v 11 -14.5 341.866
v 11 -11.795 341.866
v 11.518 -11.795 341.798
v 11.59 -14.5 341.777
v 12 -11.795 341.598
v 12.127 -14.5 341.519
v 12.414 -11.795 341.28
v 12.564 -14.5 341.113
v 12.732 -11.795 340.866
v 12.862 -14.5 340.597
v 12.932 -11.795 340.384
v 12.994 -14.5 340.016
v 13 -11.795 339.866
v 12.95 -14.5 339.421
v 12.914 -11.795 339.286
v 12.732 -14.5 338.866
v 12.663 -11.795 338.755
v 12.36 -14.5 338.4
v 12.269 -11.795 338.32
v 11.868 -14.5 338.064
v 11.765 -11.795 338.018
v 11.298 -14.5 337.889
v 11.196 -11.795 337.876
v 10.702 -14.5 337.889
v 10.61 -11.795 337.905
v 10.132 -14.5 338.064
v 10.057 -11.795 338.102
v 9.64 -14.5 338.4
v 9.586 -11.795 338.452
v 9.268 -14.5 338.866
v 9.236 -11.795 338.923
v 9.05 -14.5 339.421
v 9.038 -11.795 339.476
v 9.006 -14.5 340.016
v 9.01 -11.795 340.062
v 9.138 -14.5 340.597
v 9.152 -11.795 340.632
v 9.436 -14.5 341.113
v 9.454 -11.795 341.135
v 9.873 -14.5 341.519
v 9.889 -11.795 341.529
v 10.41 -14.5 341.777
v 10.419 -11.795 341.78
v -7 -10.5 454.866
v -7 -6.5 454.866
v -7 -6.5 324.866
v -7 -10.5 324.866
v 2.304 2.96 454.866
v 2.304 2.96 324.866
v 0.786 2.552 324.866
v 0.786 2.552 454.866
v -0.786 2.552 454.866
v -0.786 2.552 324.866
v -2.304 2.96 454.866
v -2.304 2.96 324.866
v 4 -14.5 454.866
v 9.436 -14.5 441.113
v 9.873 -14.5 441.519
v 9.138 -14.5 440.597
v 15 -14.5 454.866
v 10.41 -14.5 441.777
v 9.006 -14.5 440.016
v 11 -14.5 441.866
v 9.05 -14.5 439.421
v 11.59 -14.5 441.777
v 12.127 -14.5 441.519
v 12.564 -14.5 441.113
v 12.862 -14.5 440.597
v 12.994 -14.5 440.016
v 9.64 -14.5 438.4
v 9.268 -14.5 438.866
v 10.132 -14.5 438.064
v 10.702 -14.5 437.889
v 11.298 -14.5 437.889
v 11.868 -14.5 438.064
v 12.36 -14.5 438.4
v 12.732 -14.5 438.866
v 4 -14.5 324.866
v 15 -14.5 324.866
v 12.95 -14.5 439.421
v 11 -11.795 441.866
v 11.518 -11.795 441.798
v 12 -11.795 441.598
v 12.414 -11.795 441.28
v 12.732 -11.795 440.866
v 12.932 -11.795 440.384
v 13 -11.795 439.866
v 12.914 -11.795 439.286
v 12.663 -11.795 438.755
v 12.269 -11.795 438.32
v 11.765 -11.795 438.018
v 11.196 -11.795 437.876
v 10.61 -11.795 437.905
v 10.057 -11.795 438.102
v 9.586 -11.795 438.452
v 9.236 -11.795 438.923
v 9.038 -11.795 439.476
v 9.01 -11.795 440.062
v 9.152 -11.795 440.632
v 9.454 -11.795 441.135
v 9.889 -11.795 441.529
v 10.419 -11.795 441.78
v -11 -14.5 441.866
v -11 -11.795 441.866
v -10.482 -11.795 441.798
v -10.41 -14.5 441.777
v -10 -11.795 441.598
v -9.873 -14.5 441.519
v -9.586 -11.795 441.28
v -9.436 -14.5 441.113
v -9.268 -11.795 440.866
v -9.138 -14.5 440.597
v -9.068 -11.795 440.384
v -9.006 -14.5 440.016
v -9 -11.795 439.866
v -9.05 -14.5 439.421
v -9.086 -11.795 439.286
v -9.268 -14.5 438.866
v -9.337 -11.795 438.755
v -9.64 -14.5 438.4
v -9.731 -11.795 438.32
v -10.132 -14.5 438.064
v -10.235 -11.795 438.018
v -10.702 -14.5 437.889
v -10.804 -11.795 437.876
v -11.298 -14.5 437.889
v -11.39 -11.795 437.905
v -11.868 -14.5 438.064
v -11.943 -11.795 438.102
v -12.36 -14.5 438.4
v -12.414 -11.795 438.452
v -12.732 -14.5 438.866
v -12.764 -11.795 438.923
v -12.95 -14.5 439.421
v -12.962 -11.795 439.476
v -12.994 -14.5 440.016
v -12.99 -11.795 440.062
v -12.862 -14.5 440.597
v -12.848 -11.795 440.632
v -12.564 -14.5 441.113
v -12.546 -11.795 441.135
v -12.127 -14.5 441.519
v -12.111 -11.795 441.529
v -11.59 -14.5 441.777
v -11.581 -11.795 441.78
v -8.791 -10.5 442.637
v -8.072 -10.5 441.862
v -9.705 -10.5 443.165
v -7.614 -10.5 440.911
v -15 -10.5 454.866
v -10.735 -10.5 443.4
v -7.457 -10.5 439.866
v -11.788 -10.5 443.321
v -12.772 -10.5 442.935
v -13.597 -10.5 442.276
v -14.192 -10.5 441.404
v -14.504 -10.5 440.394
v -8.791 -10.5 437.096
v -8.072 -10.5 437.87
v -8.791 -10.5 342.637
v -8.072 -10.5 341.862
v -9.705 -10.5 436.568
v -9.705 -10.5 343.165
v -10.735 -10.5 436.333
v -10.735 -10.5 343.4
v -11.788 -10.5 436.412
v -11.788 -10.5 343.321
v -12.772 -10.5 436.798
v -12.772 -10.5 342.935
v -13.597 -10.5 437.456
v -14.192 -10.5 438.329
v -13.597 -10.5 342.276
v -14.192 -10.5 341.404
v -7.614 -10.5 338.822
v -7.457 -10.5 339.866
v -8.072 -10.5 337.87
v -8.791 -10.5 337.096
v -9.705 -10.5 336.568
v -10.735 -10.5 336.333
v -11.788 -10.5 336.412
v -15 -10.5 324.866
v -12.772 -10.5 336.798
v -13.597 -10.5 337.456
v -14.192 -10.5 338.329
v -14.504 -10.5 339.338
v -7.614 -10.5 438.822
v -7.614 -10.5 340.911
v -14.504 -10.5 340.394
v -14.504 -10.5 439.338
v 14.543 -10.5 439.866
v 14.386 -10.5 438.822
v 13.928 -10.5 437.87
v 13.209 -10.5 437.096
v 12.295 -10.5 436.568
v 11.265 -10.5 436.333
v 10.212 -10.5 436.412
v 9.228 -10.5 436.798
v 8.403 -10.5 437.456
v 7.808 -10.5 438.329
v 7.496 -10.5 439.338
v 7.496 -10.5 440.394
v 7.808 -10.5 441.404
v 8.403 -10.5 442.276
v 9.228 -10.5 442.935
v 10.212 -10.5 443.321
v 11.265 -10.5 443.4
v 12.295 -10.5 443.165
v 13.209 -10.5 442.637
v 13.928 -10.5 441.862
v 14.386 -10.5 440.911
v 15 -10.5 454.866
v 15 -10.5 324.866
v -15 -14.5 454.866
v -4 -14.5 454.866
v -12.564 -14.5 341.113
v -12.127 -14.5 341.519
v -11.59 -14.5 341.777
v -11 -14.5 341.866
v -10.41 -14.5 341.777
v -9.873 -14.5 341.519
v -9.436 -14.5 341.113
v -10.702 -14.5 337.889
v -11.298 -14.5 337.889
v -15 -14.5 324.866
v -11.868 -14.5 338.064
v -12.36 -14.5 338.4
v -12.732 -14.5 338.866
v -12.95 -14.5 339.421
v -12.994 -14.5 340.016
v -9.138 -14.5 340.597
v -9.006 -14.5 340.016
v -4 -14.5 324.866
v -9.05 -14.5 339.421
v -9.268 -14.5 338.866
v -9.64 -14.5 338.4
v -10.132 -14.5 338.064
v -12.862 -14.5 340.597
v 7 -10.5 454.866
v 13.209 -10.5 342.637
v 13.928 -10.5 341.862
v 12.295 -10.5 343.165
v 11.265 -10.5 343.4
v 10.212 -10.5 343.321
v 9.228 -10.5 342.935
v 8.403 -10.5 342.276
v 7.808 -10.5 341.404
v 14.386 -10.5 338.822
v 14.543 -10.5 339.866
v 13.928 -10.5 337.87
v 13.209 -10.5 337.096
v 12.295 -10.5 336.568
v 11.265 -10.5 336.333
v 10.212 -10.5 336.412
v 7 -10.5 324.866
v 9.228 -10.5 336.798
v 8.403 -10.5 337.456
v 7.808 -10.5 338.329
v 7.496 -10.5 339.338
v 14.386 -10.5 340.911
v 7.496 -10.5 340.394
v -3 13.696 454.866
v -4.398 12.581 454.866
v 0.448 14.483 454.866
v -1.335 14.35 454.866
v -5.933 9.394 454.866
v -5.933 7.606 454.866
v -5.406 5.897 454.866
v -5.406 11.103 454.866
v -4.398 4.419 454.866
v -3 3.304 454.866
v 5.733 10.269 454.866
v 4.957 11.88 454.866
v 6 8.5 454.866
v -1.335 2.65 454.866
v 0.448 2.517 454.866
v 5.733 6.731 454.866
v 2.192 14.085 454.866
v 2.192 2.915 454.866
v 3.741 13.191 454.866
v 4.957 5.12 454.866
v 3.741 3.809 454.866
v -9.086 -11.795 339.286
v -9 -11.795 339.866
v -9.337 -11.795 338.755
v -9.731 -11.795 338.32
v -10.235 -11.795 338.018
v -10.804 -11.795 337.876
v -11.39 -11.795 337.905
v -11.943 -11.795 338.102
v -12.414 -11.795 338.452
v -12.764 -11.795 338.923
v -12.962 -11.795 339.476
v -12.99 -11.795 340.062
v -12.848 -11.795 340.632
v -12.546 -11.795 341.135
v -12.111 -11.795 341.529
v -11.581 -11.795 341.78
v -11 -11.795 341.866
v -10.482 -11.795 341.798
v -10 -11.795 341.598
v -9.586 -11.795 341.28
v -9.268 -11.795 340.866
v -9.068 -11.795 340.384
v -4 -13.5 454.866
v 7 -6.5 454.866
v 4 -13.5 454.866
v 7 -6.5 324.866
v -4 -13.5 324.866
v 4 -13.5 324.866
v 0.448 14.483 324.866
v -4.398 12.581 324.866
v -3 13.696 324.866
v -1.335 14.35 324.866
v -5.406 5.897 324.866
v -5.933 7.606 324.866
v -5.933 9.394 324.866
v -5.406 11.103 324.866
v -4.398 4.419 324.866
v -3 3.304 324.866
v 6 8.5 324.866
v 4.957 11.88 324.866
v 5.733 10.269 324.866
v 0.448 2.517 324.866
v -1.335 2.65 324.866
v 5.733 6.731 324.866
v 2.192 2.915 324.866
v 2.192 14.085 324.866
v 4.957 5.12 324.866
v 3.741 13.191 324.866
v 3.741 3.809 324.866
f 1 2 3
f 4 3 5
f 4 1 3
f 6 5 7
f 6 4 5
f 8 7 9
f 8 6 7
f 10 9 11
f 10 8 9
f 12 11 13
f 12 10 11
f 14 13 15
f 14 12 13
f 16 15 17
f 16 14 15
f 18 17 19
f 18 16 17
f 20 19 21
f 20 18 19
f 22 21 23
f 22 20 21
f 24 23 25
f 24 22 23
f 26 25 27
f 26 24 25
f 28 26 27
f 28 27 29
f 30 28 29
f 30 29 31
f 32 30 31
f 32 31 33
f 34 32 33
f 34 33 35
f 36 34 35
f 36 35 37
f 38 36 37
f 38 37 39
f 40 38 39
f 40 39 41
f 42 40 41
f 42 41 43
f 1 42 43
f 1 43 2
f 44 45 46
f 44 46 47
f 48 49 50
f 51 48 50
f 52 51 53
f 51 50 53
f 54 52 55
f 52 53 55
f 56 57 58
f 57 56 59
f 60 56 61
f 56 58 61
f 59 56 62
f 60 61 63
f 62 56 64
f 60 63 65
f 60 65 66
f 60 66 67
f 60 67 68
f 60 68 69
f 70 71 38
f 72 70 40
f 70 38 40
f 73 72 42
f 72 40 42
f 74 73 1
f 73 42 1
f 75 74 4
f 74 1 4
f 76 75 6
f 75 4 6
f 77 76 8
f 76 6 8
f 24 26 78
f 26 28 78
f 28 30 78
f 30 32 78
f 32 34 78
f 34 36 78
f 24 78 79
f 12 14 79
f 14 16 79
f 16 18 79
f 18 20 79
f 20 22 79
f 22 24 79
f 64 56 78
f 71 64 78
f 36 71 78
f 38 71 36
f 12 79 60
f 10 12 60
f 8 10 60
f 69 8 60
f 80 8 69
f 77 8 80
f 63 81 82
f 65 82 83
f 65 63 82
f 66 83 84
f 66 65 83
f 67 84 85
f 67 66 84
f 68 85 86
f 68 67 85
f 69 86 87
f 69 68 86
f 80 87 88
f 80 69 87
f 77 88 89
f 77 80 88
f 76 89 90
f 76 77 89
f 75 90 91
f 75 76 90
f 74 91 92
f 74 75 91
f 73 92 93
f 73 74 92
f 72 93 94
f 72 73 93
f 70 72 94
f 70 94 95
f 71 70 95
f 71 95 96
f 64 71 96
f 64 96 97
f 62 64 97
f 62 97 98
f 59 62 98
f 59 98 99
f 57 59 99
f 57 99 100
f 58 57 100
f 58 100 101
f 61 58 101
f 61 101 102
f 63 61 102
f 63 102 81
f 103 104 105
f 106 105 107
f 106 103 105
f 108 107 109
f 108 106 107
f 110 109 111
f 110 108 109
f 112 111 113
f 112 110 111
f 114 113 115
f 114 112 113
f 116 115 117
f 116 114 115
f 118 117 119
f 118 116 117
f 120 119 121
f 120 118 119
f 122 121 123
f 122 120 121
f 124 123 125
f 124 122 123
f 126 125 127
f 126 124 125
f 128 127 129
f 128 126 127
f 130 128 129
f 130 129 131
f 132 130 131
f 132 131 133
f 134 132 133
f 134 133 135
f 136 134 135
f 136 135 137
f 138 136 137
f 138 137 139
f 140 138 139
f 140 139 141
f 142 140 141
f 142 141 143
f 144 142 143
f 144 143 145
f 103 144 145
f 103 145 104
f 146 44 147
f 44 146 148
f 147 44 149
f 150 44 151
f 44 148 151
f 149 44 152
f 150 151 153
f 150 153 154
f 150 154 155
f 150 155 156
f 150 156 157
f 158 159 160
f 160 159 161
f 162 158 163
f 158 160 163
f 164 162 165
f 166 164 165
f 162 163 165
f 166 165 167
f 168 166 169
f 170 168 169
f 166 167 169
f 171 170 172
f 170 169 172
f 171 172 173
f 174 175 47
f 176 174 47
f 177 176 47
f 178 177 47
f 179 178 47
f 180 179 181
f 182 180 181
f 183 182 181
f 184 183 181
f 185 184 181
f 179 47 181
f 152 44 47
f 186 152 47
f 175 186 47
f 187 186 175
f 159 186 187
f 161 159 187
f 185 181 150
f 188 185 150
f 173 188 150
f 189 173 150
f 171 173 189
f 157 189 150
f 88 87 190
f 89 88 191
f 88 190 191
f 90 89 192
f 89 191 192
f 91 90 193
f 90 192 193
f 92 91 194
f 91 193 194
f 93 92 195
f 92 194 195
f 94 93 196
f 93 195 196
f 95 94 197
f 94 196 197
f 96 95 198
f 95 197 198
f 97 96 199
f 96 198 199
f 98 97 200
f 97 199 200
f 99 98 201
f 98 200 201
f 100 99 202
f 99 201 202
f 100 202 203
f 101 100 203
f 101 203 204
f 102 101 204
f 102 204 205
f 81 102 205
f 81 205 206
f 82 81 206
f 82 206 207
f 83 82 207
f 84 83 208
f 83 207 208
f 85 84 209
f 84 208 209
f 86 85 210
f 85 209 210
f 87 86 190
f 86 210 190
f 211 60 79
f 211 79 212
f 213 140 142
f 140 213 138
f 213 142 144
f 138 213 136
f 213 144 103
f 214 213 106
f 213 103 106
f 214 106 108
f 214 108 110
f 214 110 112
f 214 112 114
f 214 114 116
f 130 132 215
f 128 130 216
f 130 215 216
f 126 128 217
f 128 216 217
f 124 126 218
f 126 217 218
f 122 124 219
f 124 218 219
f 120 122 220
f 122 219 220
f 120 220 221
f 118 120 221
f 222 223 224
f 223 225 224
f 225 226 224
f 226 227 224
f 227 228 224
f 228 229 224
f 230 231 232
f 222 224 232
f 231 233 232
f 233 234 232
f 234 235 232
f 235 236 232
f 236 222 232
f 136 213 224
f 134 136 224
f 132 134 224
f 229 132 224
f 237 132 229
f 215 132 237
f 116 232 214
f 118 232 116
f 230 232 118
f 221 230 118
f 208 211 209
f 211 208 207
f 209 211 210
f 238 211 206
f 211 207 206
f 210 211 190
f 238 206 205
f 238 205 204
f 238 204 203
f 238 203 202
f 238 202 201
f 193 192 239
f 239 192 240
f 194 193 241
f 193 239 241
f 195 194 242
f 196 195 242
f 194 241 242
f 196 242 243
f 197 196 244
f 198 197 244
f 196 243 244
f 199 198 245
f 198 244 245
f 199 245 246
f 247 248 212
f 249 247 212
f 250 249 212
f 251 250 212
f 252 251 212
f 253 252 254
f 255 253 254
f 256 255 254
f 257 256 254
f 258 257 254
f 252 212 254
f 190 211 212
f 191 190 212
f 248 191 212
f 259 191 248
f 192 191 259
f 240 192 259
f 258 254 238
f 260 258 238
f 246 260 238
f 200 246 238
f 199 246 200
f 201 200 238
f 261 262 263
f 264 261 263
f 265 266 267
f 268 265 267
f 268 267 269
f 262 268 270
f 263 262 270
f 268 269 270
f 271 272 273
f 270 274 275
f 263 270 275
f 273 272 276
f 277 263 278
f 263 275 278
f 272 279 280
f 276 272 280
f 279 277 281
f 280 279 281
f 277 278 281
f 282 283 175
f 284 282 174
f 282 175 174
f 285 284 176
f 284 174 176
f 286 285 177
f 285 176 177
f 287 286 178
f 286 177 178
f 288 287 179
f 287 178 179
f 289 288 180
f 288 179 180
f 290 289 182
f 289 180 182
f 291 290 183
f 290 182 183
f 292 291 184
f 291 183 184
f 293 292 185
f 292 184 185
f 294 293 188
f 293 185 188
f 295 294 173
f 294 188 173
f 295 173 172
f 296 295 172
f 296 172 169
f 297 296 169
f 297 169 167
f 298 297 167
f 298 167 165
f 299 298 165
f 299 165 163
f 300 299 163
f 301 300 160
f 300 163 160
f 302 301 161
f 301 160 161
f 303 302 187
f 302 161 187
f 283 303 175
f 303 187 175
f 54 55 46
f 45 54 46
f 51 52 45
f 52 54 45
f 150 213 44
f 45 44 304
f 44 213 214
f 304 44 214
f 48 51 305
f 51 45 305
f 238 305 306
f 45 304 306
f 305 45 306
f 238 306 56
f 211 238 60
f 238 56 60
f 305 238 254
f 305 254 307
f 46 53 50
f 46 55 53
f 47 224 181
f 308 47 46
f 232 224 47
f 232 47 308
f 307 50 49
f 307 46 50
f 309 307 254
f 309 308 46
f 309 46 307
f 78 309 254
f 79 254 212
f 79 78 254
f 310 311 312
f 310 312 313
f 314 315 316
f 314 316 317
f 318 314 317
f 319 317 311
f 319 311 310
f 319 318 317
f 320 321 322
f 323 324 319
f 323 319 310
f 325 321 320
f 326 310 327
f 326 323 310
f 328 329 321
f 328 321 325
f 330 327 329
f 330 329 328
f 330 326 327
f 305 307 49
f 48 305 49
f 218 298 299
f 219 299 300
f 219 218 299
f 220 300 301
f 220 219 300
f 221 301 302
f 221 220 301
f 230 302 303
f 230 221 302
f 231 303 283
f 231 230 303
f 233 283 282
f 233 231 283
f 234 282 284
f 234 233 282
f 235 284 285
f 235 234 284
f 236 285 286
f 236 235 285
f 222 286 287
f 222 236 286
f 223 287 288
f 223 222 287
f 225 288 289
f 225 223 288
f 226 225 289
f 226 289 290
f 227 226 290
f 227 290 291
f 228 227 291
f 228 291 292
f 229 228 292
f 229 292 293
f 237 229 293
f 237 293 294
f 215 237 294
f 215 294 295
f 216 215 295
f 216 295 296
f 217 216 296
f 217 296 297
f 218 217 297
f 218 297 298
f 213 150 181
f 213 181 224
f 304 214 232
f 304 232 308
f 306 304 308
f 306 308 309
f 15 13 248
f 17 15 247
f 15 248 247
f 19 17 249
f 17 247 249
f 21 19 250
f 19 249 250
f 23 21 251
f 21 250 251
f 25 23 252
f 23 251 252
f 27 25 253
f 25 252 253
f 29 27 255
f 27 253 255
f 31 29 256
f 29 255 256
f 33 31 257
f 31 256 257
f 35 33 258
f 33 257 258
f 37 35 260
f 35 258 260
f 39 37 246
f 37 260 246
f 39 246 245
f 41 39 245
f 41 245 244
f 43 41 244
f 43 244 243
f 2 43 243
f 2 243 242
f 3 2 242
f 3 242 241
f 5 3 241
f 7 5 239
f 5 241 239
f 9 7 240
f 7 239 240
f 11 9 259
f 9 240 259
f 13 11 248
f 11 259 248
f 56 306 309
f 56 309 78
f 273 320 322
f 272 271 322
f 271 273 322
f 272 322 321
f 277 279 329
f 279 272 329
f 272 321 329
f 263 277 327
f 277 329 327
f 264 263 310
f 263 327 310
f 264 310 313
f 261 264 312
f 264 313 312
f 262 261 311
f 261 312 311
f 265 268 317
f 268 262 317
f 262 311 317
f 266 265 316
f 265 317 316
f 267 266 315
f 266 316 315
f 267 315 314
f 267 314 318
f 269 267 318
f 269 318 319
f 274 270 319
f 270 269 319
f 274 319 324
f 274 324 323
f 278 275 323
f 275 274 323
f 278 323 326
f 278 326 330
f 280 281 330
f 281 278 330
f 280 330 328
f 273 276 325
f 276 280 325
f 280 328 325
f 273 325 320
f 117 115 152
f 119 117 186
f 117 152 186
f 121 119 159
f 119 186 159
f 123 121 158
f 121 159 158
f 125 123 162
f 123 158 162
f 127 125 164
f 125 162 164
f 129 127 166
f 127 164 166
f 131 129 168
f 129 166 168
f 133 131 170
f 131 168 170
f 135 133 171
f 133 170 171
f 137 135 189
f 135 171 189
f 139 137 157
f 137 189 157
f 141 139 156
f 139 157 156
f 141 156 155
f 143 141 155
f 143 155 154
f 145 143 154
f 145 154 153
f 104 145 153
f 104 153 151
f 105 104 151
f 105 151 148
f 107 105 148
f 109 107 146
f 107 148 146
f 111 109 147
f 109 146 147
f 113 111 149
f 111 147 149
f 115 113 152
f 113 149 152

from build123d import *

# Parameters (mm, degrees)
RAILBASE_DEPTH     = 750
SKETCH3_R          = 6
RAIL_DEPTH         = 750
CUT_EXTRUDE1_START = -4
SKETCH4_R          = 2
CUT_EXTRUDE1_DEPTH = 4
SKETCH11_W         = 30
SKETCH11_H         = 324.866250412
SKETCH11_H_2       = 295.133749588
CUT_EXTRUDE2_DEPTH = 86


# Read off the part's stored shape, not the designer's step: AdvancedHole5
with BuildPart() as part:
    # Sketch2 → RailBase (new body)
    with BuildSketch(Plane.XY):
        with BuildLine():
            Line((7, -14.5), (15, -14.5))
            Line((15, -14.5), (15, -10.5))
            Line((15, -10.5), (7, -10.5))
            Line((7, -10.5), (7, -6.5))
            Line((7, -6.5), (2.30401202, 2.960006443))
            ThreePointArc((2.30401202, 2.960006443), (0, 2.5), (-2.30401202, 2.960006443))
            Line((-2.30401202, 2.960006443), (-7, -6.5))
            Line((-7, -6.5), (-7, -10.5))
            Line((-7, -10.5), (-15, -10.5))
            Line((-15, -10.5), (-15, -14.5))
            Line((-15, -14.5), (-7, -14.5))
            Line((-7, -14.5), (-4, -14.5))
            Line((-4, -14.5), (-4, -13.5))
            Line((-4, -13.5), (4, -13.5))
            Line((4, -13.5), (4, -14.5))
            Line((4, -14.5), (7, -14.5))
        make_face()
    extrude(amount=RAILBASE_DEPTH)

    # Sketch4 → Cut-Extrude1 (cut)
    with BuildSketch(Plane(origin=(0, -10.5, 0), x_dir=(1, 0, 0), z_dir=(0, 1, 0)).offset(CUT_EXTRUDE1_START)):
        with Locations(Location((11, -739.866250412, 0), (0, 0, 270))):
            Circle(SKETCH4_R)
        with Locations(Location((-11, -739.866250412, 0), (0, 0, 270))):
            Circle(SKETCH4_R)
        with Locations(Location((-11, -639.866250412, 0), (0, 0, 270))):
            Circle(SKETCH4_R)
        with Locations(Location((-11, -539.866250412, 0), (0, 0, 270))):
            Circle(SKETCH4_R)
        with Locations(Location((-11, -439.866250412, 0), (0, 0, 270))):
            Circle(SKETCH4_R)
        with Locations(Location((-11, -339.866250412, 0), (0, 0, 270))):
            Circle(SKETCH4_R)
        with Locations(Location((-11, -239.866250412, 0), (0, 0, 270))):
            Circle(SKETCH4_R)
        with Locations(Location((-11, -139.866250412, 0), (0, 0, 270))):
            Circle(SKETCH4_R)
        with Locations(Location((-11, -39.866250412, 0), (0, 0, 270))):
            Circle(SKETCH4_R)
        with Locations(Location((11, -639.866250412, 0), (0, 0, 270))):
            Circle(SKETCH4_R)
        with Locations(Location((11, -539.866250412, 0), (0, 0, 270))):
            Circle(SKETCH4_R)
        with Locations(Location((11, -439.866250412, 0), (0, 0, 270))):
            Circle(SKETCH4_R)
        with Locations(Location((11, -339.866250412, 0), (0, 0, 270))):
            Circle(SKETCH4_R)
        with Locations(Location((11, -239.866250412, 0), (0, 0, 270))):
            Circle(SKETCH4_R)
        with Locations(Location((11, -139.866250412, 0), (0, 0, 270))):
            Circle(SKETCH4_R)
        with Locations(Location((11, -39.866250412, 0), (0, 0, 270))):
            Circle(SKETCH4_R)
    extrude(amount=CUT_EXTRUDE1_DEPTH, mode=Mode.SUBTRACT)

    # AdvancedHole5 outline → AdvancedHole5 (revolve, cut)
    with BuildSketch(Plane(origin=(-11, 0, 39.866250412), x_dir=(1, 0, 0), z_dir=(0, 0, 1))):
        Polygon((2, -10.5), (2, -11.794982461), (3.5433, -10.5), align=None)
    revolve(axis=Axis((-11, 0, 39.866250412), (0, 1, 0)), mode=Mode.SUBTRACT)

    # AdvancedHole5 2 outline → AdvancedHole5 2 (revolve, cut)
    with BuildSketch(Plane(origin=(11, 0, 39.866250412), x_dir=(1, 0, 0), z_dir=(0, 0, 1))):
        Polygon((2, -10.5), (2, -11.794982461), (3.5433, -10.5), align=None)
    revolve(axis=Axis((11, 0, 39.866250412), (0, 1, 0)), mode=Mode.SUBTRACT)

    # AdvancedHole5 3 outline → AdvancedHole5 3 (revolve, cut)
    with BuildSketch(Plane(origin=(-11, 0, 139.866250412), x_dir=(1, 0, 0), z_dir=(0, 0, 1))):
        Polygon((2, -10.5), (2, -11.794982461), (3.5433, -10.5), align=None)
    revolve(axis=Axis((-11, 0, 139.866250412), (0, 1, 0)), mode=Mode.SUBTRACT)

    # AdvancedHole5 4 outline → AdvancedHole5 4 (revolve, cut)
    with BuildSketch(Plane(origin=(11, 0, 139.866250412), x_dir=(1, 0, 0), z_dir=(0, 0, 1))):
        Polygon((2, -10.5), (2, -11.794982461), (3.5433, -10.5), align=None)
    revolve(axis=Axis((11, 0, 139.866250412), (0, 1, 0)), mode=Mode.SUBTRACT)

    # AdvancedHole5 5 outline → AdvancedHole5 5 (revolve, cut)
    with BuildSketch(Plane(origin=(-11, 0, 239.866250412), x_dir=(1, 0, 0), z_dir=(0, 0, 1))):
        Polygon((2, -10.5), (2, -11.794982461), (3.5433, -10.5), align=None)
    revolve(axis=Axis((-11, 0, 239.866250412), (0, 1, 0)), mode=Mode.SUBTRACT)

    # AdvancedHole5 6 outline → AdvancedHole5 6 (revolve, cut)
    with BuildSketch(Plane(origin=(11, 0, 239.866250412), x_dir=(1, 0, 0), z_dir=(0, 0, 1))):
        Polygon((2, -10.5), (2, -11.794982461), (3.5433, -10.5), align=None)
    revolve(axis=Axis((11, 0, 239.866250412), (0, 1, 0)), mode=Mode.SUBTRACT)

    # AdvancedHole5 7 outline → AdvancedHole5 7 (revolve, cut)
    with BuildSketch(Plane(origin=(11, 0, 339.866250412), x_dir=(1, 0, 0), z_dir=(0, 0, 1))):
        Polygon((2, -10.5), (2, -11.794982461), (3.5433, -10.5), align=None)
    revolve(axis=Axis((11, 0, 339.866250412), (0, 1, 0)), mode=Mode.SUBTRACT)

    # AdvancedHole5 8 outline → AdvancedHole5 8 (revolve, cut)
    with BuildSketch(Plane(origin=(-11, 0, 339.866250412), x_dir=(1, 0, 0), z_dir=(0, 0, 1))):
        Polygon((2, -10.5), (2, -11.794982461), (3.5433, -10.5), align=None)
    revolve(axis=Axis((-11, 0, 339.866250412), (0, 1, 0)), mode=Mode.SUBTRACT)

    # AdvancedHole5 9 outline → AdvancedHole5 9 (revolve, cut)
    with BuildSketch(Plane(origin=(11, 0, 439.866250412), x_dir=(1, 0, 0), z_dir=(0, 0, 1))):
        Polygon((2, -10.5), (2, -11.794982461), (3.5433, -10.5), align=None)
    revolve(axis=Axis((11, 0, 439.866250412), (0, 1, 0)), mode=Mode.SUBTRACT)

    # AdvancedHole5 10 outline → AdvancedHole5 10 (revolve, cut)
    with BuildSketch(Plane(origin=(-11, 0, 439.866250412), x_dir=(1, 0, 0), z_dir=(0, 0, 1))):
        Polygon((2, -10.5), (2, -11.794982461), (3.5433, -10.5), align=None)
    revolve(axis=Axis((-11, 0, 439.866250412), (0, 1, 0)), mode=Mode.SUBTRACT)

    # AdvancedHole5 11 outline → AdvancedHole5 11 (revolve, cut)
    with BuildSketch(Plane(origin=(-11, 0, 539.866250412), x_dir=(1, 0, 0), z_dir=(0, 0, 1))):
        Polygon((2, -10.5), (2, -11.794982461), (3.5433, -10.5), align=None)
    revolve(axis=Axis((-11, 0, 539.866250412), (0, 1, 0)), mode=Mode.SUBTRACT)

    # AdvancedHole5 12 outline → AdvancedHole5 12 (revolve, cut)
    with BuildSketch(Plane(origin=(11, 0, 539.866250412), x_dir=(1, 0, 0), z_dir=(0, 0, 1))):
        Polygon((2, -10.5), (2, -11.794982461), (3.5433, -10.5), align=None)
    revolve(axis=Axis((11, 0, 539.866250412), (0, 1, 0)), mode=Mode.SUBTRACT)

    # AdvancedHole5 13 outline → AdvancedHole5 13 (revolve, cut)
    with BuildSketch(Plane(origin=(-11, 0, 639.866250412), x_dir=(1, 0, 0), z_dir=(0, 0, 1))):
        Polygon((2, -10.5), (2, -11.794982461), (3.5433, -10.5), align=None)
    revolve(axis=Axis((-11, 0, 639.866250412), (0, 1, 0)), mode=Mode.SUBTRACT)

    # AdvancedHole5 14 outline → AdvancedHole5 14 (revolve, cut)
    with BuildSketch(Plane(origin=(11, 0, 639.866250412), x_dir=(1, 0, 0), z_dir=(0, 0, 1))):
        Polygon((2, -10.5), (2, -11.794982461), (3.5433, -10.5), align=None)
    revolve(axis=Axis((11, 0, 639.866250412), (0, 1, 0)), mode=Mode.SUBTRACT)

    # AdvancedHole5 15 outline → AdvancedHole5 15 (revolve, cut)
    with BuildSketch(Plane(origin=(11, 0, 739.866250412), x_dir=(1, 0, 0), z_dir=(0, 0, 1))):
        Polygon((2, -10.5), (2, -11.794982461), (3.5433, -10.5), align=None)
    revolve(axis=Axis((11, 0, 739.866250412), (0, 1, 0)), mode=Mode.SUBTRACT)

    # AdvancedHole5 16 outline → AdvancedHole5 16 (revolve, cut)
    with BuildSketch(Plane(origin=(-11, 0, 739.866250412), x_dir=(1, 0, 0), z_dir=(0, 0, 1))):
        Polygon((2, -10.5), (2, -11.794982461), (3.5433, -10.5), align=None)
    revolve(axis=Axis((-11, 0, 739.866250412), (0, 1, 0)), mode=Mode.SUBTRACT)


with BuildPart() as body_2:
    # Sketch3 → Rail (new body)
    with BuildSketch(Plane.XY):
        with Locations((0, 8.5)):
            Circle(SKETCH3_R)
    extrude(amount=RAIL_DEPTH)


with BuildPart() as cut_extrude2_tool:
    # Sketch11 → Cut-Extrude2 (new body)
    with BuildSketch(Plane.XZ.offset(14.5)):
        with Locations((0, 162.433125206)):
            Rectangle(SKETCH11_W, SKETCH11_H)
        with Locations((0, 602.433125206)):
            Rectangle(SKETCH11_W, SKETCH11_H_2)
    extrude(amount=-CUT_EXTRUDE2_DEPTH)


with BuildPart() as part_1:
    add(part.part)

    # Cut-Extrude2: cut by cut_extrude2_tool
    add(cut_extrude2_tool.part, mode=Mode.SUBTRACT)


with BuildPart() as body_2_1:
    add(body_2.part)

    # Cut-Extrude2: cut by cut_extrude2_tool
    add(cut_extrude2_tool.part, mode=Mode.SUBTRACT)


solid = Compound([part_1.part, body_2_1.part])
